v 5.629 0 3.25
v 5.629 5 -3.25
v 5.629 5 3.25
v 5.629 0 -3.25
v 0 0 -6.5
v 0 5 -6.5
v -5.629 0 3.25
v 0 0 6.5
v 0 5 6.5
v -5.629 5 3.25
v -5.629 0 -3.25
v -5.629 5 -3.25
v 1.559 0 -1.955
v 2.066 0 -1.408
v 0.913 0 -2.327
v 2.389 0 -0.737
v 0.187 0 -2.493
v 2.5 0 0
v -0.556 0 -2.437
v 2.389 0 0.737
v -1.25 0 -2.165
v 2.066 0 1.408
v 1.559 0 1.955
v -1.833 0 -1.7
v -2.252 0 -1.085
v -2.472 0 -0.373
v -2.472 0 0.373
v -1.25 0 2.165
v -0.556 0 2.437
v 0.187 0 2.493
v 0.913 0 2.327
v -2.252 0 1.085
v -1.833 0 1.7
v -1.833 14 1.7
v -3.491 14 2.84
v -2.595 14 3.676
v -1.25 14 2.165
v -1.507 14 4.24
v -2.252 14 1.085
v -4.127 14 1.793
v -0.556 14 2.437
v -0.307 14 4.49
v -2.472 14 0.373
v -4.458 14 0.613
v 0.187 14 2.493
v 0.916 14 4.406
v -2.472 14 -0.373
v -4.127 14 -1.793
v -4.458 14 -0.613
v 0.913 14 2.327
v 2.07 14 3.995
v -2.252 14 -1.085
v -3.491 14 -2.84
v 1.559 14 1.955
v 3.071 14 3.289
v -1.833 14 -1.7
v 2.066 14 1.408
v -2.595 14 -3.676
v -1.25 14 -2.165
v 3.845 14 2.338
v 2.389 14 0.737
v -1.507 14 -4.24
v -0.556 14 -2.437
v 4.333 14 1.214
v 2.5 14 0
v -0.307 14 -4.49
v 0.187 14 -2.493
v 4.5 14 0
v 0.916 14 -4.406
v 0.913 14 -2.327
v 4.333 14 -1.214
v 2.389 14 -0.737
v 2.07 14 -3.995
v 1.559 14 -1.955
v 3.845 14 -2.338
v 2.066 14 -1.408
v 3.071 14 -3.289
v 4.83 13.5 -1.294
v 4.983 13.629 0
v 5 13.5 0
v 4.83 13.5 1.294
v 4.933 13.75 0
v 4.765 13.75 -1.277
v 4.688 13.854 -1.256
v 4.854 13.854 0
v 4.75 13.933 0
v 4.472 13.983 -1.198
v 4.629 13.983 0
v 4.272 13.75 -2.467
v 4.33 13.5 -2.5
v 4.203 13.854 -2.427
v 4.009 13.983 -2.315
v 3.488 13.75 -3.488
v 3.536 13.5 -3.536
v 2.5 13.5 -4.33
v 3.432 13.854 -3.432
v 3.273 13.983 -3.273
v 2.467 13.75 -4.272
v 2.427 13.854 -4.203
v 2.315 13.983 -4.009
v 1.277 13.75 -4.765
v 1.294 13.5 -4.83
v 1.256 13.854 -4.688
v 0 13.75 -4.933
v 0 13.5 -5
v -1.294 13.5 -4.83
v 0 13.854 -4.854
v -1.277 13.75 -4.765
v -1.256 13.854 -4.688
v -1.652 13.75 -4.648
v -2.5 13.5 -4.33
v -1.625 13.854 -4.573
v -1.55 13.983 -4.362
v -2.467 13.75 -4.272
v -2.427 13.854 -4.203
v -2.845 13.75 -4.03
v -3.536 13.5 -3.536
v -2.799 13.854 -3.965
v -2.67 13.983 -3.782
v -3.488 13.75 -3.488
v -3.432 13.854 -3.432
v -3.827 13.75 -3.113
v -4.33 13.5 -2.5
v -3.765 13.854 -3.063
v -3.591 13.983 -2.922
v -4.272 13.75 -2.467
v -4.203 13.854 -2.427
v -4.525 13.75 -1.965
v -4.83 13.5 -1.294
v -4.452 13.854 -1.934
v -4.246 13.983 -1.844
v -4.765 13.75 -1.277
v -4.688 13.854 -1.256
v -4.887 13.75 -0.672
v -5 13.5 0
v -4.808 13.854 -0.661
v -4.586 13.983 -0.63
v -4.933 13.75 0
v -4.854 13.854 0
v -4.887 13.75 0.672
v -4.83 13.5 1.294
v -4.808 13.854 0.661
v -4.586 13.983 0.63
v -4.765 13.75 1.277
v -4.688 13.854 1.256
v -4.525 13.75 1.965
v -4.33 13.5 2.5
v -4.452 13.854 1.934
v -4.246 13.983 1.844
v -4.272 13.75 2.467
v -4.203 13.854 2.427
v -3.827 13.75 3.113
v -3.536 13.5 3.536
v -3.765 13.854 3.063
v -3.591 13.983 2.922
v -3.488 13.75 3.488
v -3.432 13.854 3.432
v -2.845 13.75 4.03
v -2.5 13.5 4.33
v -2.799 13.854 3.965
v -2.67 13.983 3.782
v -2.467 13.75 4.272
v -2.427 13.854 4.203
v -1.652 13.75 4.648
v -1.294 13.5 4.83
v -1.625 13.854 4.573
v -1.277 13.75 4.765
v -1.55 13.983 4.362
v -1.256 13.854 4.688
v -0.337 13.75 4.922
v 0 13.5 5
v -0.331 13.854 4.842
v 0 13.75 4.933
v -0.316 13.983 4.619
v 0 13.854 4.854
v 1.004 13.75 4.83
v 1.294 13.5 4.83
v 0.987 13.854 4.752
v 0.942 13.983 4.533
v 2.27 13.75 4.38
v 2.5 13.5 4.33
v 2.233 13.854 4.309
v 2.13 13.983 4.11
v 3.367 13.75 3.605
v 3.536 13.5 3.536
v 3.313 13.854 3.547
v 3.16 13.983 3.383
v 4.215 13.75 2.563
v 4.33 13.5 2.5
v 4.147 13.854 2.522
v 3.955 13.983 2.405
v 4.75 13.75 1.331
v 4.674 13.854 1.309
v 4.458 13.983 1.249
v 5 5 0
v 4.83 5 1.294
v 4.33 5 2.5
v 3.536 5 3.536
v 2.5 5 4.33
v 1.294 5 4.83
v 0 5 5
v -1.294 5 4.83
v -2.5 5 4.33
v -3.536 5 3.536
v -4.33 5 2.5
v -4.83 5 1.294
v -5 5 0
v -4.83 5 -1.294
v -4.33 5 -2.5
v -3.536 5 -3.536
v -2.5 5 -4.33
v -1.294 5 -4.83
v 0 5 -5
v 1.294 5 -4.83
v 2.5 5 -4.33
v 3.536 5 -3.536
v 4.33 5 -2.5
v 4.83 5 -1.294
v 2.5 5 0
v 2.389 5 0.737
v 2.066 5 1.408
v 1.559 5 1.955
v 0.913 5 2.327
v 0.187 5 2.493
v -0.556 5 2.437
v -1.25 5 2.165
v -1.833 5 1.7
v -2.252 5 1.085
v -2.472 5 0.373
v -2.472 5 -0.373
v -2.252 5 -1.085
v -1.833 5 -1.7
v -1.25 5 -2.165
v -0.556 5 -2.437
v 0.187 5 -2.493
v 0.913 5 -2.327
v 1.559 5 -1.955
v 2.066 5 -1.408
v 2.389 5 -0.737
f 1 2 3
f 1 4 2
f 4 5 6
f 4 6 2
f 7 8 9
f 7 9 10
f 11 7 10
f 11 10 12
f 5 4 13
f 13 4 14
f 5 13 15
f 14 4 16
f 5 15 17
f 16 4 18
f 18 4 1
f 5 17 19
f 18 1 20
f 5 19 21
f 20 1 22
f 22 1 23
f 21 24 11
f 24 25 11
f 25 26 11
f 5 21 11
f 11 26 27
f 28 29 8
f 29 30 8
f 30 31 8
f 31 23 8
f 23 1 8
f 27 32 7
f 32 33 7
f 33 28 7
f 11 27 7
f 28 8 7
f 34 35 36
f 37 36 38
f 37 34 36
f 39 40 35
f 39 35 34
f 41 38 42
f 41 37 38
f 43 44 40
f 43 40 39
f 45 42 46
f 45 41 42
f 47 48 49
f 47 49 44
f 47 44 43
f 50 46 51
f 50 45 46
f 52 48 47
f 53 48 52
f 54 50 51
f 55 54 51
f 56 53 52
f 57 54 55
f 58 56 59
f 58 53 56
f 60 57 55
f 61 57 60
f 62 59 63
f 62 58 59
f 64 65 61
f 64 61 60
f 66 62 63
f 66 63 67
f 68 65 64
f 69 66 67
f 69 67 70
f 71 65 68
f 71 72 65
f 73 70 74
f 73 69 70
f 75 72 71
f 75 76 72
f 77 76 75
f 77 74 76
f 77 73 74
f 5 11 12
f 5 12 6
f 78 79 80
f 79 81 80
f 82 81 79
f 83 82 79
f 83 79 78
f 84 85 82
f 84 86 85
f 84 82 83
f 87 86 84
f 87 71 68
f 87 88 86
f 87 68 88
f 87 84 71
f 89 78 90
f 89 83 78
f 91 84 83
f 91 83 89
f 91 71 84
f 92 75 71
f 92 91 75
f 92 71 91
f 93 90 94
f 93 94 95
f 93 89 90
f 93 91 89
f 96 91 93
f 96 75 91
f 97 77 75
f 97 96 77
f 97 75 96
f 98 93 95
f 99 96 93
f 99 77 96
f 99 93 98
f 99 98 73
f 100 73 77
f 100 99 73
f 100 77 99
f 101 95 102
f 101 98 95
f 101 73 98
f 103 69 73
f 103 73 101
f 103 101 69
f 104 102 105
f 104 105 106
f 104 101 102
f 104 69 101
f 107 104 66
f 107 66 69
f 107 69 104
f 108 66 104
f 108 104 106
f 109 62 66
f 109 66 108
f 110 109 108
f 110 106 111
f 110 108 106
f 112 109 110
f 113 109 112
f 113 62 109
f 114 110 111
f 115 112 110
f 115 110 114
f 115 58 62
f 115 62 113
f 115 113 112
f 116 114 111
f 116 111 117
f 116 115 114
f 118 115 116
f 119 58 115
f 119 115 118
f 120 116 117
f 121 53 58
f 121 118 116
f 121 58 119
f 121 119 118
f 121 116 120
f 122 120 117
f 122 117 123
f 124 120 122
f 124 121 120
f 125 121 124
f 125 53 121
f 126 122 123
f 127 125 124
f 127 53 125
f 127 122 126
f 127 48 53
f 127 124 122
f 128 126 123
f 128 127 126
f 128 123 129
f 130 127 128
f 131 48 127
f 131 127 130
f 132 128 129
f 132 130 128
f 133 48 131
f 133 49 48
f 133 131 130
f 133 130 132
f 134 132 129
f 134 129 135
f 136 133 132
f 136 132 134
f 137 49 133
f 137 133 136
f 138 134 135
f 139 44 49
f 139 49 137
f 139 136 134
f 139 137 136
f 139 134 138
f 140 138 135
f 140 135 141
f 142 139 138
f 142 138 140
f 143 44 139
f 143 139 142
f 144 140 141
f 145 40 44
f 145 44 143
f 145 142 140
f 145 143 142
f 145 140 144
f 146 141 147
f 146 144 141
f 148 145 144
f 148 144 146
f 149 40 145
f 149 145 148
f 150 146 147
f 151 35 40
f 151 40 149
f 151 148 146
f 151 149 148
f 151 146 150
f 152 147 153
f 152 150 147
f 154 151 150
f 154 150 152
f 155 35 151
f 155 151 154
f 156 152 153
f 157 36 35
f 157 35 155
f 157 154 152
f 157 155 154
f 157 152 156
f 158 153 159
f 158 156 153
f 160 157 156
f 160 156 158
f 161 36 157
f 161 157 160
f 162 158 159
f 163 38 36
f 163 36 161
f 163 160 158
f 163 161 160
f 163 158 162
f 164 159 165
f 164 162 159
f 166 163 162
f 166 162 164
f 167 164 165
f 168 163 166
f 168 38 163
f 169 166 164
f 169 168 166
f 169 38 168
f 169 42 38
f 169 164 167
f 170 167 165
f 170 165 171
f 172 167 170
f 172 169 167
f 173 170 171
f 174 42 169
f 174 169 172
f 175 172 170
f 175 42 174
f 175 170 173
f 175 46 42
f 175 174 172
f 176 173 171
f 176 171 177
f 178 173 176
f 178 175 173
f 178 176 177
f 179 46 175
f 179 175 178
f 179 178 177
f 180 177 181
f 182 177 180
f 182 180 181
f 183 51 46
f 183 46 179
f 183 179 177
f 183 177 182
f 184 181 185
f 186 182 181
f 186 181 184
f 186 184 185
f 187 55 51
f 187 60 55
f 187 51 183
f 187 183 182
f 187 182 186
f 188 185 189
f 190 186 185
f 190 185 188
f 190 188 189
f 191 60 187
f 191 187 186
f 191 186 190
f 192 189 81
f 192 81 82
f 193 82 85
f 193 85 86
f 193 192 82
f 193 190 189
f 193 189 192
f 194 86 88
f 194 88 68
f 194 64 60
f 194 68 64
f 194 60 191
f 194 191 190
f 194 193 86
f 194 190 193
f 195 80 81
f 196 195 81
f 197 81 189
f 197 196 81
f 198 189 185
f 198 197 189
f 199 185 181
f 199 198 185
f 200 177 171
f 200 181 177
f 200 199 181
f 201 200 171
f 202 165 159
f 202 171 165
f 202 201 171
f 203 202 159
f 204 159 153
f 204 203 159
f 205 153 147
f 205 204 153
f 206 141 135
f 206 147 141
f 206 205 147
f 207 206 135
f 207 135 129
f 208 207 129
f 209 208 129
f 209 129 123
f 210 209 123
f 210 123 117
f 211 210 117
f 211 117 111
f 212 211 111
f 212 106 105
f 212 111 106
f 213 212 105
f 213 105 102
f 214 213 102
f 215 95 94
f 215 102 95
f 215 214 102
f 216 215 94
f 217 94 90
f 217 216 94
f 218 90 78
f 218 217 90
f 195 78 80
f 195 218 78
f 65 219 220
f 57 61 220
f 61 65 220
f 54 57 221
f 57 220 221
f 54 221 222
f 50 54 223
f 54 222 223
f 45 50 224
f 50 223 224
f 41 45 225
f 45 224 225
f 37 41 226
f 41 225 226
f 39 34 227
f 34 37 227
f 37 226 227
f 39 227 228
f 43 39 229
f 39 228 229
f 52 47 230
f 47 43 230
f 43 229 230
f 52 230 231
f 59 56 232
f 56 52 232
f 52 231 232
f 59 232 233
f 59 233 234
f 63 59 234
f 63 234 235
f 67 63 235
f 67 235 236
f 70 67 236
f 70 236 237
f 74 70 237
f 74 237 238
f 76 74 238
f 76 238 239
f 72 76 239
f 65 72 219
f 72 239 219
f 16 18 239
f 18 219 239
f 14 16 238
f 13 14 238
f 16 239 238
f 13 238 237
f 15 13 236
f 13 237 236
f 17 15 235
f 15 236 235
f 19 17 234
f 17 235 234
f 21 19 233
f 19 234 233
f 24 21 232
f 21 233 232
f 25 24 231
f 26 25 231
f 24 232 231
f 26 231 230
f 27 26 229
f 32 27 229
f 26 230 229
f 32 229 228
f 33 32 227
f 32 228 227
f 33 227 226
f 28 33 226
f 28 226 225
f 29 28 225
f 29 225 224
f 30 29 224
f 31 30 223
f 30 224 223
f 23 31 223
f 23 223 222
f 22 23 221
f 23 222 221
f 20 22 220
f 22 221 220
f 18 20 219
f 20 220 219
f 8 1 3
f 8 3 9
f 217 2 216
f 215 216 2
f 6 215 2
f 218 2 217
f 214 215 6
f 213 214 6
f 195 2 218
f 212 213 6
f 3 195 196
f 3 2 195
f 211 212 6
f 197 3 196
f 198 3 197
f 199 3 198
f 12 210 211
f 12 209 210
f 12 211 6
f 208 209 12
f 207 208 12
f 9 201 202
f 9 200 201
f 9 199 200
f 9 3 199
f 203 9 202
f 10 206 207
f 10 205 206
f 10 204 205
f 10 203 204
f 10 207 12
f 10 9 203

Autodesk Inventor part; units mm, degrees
ref_plane "YZ Plane" through (0, 0, 0) normal (1, 0, 0) x (0, 1, 0)
ref_plane "XZ Plane" through (0, 0, 0) normal (0, 1, 0) x (-1, 0, 0)
ref_plane "XY Plane" through (0, 0, 0) normal (0, 0, 1) x (1, 0, 0)
sketch "Sketch1" plane through (0, 0, 0) normal (0, 1, 0) x (-1, 0, 0)
  line L0 (0, 0) -> (0, -6.5) construction
  line L1 (0, -6.5) -> (0, 6.5) construction
  line L2 (0, -6.5) -> (-5.6292, -3.25)
  line L3 (-5.6292, -3.25) -> (-5.6292, 3.25)
  line L4 (-5.6292, 3.25) -> (0, 6.5)
  line L5 (0, 6.5) -> (5.6292, 3.25)
  line L6 (5.6292, 3.25) -> (5.6292, -3.25)
  line L7 (5.6292, -3.25) -> (0, -6.5)
extrude "Extrusion1" add sketch "Sketch1" along normal blind 5
sketch "Sketch2" plane through (0, 5, 0) normal (0, 1, 0) x (1, 0, 0)
  circle A0 centre (0, 0) radius 2.5
  circle A1 centre (0, 0) radius 5
  dimension "d4" = 5
  dimension "d5" = 10
extrude "Extrusion2" add sketch "Sketch2" along normal blind 9
sketch "Sketch3" plane through (0, 5, 0) normal (0, 1, 0) x (1, 0, 0)
  circle A0 centre (0, 0) radius 2.5
extrude "Extrusion3" cut sketch "Sketch3" against normal through all
thread "Thread1" size "M10x1.5" class "6g" standard "ANSI Metric M Profile" full length
fillet "Fillet1" radius 0.5 1 edges at (-5, 14, 0)
properties part number "Premistoppa M10x1"
